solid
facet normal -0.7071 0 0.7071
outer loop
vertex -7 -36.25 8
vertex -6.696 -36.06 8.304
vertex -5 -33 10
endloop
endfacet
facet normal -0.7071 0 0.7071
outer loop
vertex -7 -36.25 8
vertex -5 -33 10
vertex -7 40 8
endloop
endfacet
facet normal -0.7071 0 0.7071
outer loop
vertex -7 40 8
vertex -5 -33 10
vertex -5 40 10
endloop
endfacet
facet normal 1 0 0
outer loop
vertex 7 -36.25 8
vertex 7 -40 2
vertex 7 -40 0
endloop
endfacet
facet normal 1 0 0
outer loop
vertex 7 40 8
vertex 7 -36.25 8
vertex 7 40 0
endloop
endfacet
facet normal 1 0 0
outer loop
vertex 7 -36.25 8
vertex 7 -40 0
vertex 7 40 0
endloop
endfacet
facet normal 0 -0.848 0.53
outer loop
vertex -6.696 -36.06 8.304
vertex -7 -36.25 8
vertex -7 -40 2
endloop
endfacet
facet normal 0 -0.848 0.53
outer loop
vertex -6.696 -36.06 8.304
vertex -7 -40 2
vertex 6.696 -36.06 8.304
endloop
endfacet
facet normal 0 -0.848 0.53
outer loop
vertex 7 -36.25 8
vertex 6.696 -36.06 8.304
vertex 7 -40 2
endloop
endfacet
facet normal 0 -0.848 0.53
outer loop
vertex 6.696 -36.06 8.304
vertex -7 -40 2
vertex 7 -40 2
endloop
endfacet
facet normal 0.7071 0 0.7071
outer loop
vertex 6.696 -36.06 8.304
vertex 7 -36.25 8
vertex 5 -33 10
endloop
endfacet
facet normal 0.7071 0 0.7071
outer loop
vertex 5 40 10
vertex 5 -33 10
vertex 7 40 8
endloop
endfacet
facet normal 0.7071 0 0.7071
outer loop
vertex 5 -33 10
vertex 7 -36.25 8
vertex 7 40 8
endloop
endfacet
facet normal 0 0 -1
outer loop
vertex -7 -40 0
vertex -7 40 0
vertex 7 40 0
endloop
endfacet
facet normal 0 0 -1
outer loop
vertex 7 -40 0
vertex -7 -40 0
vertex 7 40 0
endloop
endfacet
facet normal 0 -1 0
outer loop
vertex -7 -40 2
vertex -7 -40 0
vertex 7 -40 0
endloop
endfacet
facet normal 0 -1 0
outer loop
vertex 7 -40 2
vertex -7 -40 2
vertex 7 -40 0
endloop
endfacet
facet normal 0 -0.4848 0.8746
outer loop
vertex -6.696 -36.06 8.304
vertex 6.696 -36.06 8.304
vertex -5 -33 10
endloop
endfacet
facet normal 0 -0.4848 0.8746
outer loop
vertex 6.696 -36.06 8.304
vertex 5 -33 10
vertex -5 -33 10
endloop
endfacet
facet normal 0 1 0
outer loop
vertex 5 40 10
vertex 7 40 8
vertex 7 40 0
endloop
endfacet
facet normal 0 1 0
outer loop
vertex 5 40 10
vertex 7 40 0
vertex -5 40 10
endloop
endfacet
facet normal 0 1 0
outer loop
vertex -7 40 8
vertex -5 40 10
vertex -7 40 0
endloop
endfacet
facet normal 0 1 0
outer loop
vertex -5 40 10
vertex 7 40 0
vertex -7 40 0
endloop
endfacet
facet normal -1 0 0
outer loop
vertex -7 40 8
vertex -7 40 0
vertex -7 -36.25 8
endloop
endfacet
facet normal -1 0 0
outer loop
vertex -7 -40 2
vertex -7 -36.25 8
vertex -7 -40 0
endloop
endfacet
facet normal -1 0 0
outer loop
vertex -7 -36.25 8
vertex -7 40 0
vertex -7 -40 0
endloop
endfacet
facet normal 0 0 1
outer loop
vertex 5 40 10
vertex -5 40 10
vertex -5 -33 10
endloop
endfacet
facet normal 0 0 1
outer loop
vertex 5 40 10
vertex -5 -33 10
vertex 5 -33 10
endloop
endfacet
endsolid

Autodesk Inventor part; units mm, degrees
ref_plane "YZ Plane" through (0, 0, 0) normal (1, 0, 0) x (0, 1, 0)
ref_plane "XZ Plane" through (0, 0, 0) normal (0, 1, 0) x (-1, 0, 0)
ref_plane "XY Plane" through (0, 0, 0) normal (0, 0, 1) x (1, 0, 0)
sketch "Sketch1" plane through (0, 0, 0) normal (0, 0, 1) x (1, 0, 0)
  line L0 (-7, -40) -> (7, -40)
  line L1 (7, -40) -> (7, 40)
  line L2 (7, 40) -> (-7, 40)
  line L3 (-7, 40) -> (-7, -40)
  line L4 (-7, -40) -> (7, 40) construction
  line L5 (7, -40) -> (-7, 40) construction
  point P0 (0, 0)
  dimension "d0" = 14
  dimension "d1" = 80
extrude "Extrusion1" add sketch "Sketch1" along normal blind 10
chamfer "Chamfer1" distance 5 distance2 8 1 edges at (0, -40, 10) measured on face at (-2.3333, 13.3333, 10)
chamfer "Chamfer2" distance 2 angle 45 3 edges at (7, 2.5, 10) (-7, 2.5, 10) (0, -35, 10)
equation "\"d0\" = 2 * blackkey_halfwidth"
equation "\"d1\" = blackkey_length"
equation "\"d2\" = 0.5 * key_height"
equation "\"blackkey_halfwidth\" = 7"
equation "\"blackkey_length\" = 80"
equation "\"key_height\" = 20"
properties part number "key_black"
